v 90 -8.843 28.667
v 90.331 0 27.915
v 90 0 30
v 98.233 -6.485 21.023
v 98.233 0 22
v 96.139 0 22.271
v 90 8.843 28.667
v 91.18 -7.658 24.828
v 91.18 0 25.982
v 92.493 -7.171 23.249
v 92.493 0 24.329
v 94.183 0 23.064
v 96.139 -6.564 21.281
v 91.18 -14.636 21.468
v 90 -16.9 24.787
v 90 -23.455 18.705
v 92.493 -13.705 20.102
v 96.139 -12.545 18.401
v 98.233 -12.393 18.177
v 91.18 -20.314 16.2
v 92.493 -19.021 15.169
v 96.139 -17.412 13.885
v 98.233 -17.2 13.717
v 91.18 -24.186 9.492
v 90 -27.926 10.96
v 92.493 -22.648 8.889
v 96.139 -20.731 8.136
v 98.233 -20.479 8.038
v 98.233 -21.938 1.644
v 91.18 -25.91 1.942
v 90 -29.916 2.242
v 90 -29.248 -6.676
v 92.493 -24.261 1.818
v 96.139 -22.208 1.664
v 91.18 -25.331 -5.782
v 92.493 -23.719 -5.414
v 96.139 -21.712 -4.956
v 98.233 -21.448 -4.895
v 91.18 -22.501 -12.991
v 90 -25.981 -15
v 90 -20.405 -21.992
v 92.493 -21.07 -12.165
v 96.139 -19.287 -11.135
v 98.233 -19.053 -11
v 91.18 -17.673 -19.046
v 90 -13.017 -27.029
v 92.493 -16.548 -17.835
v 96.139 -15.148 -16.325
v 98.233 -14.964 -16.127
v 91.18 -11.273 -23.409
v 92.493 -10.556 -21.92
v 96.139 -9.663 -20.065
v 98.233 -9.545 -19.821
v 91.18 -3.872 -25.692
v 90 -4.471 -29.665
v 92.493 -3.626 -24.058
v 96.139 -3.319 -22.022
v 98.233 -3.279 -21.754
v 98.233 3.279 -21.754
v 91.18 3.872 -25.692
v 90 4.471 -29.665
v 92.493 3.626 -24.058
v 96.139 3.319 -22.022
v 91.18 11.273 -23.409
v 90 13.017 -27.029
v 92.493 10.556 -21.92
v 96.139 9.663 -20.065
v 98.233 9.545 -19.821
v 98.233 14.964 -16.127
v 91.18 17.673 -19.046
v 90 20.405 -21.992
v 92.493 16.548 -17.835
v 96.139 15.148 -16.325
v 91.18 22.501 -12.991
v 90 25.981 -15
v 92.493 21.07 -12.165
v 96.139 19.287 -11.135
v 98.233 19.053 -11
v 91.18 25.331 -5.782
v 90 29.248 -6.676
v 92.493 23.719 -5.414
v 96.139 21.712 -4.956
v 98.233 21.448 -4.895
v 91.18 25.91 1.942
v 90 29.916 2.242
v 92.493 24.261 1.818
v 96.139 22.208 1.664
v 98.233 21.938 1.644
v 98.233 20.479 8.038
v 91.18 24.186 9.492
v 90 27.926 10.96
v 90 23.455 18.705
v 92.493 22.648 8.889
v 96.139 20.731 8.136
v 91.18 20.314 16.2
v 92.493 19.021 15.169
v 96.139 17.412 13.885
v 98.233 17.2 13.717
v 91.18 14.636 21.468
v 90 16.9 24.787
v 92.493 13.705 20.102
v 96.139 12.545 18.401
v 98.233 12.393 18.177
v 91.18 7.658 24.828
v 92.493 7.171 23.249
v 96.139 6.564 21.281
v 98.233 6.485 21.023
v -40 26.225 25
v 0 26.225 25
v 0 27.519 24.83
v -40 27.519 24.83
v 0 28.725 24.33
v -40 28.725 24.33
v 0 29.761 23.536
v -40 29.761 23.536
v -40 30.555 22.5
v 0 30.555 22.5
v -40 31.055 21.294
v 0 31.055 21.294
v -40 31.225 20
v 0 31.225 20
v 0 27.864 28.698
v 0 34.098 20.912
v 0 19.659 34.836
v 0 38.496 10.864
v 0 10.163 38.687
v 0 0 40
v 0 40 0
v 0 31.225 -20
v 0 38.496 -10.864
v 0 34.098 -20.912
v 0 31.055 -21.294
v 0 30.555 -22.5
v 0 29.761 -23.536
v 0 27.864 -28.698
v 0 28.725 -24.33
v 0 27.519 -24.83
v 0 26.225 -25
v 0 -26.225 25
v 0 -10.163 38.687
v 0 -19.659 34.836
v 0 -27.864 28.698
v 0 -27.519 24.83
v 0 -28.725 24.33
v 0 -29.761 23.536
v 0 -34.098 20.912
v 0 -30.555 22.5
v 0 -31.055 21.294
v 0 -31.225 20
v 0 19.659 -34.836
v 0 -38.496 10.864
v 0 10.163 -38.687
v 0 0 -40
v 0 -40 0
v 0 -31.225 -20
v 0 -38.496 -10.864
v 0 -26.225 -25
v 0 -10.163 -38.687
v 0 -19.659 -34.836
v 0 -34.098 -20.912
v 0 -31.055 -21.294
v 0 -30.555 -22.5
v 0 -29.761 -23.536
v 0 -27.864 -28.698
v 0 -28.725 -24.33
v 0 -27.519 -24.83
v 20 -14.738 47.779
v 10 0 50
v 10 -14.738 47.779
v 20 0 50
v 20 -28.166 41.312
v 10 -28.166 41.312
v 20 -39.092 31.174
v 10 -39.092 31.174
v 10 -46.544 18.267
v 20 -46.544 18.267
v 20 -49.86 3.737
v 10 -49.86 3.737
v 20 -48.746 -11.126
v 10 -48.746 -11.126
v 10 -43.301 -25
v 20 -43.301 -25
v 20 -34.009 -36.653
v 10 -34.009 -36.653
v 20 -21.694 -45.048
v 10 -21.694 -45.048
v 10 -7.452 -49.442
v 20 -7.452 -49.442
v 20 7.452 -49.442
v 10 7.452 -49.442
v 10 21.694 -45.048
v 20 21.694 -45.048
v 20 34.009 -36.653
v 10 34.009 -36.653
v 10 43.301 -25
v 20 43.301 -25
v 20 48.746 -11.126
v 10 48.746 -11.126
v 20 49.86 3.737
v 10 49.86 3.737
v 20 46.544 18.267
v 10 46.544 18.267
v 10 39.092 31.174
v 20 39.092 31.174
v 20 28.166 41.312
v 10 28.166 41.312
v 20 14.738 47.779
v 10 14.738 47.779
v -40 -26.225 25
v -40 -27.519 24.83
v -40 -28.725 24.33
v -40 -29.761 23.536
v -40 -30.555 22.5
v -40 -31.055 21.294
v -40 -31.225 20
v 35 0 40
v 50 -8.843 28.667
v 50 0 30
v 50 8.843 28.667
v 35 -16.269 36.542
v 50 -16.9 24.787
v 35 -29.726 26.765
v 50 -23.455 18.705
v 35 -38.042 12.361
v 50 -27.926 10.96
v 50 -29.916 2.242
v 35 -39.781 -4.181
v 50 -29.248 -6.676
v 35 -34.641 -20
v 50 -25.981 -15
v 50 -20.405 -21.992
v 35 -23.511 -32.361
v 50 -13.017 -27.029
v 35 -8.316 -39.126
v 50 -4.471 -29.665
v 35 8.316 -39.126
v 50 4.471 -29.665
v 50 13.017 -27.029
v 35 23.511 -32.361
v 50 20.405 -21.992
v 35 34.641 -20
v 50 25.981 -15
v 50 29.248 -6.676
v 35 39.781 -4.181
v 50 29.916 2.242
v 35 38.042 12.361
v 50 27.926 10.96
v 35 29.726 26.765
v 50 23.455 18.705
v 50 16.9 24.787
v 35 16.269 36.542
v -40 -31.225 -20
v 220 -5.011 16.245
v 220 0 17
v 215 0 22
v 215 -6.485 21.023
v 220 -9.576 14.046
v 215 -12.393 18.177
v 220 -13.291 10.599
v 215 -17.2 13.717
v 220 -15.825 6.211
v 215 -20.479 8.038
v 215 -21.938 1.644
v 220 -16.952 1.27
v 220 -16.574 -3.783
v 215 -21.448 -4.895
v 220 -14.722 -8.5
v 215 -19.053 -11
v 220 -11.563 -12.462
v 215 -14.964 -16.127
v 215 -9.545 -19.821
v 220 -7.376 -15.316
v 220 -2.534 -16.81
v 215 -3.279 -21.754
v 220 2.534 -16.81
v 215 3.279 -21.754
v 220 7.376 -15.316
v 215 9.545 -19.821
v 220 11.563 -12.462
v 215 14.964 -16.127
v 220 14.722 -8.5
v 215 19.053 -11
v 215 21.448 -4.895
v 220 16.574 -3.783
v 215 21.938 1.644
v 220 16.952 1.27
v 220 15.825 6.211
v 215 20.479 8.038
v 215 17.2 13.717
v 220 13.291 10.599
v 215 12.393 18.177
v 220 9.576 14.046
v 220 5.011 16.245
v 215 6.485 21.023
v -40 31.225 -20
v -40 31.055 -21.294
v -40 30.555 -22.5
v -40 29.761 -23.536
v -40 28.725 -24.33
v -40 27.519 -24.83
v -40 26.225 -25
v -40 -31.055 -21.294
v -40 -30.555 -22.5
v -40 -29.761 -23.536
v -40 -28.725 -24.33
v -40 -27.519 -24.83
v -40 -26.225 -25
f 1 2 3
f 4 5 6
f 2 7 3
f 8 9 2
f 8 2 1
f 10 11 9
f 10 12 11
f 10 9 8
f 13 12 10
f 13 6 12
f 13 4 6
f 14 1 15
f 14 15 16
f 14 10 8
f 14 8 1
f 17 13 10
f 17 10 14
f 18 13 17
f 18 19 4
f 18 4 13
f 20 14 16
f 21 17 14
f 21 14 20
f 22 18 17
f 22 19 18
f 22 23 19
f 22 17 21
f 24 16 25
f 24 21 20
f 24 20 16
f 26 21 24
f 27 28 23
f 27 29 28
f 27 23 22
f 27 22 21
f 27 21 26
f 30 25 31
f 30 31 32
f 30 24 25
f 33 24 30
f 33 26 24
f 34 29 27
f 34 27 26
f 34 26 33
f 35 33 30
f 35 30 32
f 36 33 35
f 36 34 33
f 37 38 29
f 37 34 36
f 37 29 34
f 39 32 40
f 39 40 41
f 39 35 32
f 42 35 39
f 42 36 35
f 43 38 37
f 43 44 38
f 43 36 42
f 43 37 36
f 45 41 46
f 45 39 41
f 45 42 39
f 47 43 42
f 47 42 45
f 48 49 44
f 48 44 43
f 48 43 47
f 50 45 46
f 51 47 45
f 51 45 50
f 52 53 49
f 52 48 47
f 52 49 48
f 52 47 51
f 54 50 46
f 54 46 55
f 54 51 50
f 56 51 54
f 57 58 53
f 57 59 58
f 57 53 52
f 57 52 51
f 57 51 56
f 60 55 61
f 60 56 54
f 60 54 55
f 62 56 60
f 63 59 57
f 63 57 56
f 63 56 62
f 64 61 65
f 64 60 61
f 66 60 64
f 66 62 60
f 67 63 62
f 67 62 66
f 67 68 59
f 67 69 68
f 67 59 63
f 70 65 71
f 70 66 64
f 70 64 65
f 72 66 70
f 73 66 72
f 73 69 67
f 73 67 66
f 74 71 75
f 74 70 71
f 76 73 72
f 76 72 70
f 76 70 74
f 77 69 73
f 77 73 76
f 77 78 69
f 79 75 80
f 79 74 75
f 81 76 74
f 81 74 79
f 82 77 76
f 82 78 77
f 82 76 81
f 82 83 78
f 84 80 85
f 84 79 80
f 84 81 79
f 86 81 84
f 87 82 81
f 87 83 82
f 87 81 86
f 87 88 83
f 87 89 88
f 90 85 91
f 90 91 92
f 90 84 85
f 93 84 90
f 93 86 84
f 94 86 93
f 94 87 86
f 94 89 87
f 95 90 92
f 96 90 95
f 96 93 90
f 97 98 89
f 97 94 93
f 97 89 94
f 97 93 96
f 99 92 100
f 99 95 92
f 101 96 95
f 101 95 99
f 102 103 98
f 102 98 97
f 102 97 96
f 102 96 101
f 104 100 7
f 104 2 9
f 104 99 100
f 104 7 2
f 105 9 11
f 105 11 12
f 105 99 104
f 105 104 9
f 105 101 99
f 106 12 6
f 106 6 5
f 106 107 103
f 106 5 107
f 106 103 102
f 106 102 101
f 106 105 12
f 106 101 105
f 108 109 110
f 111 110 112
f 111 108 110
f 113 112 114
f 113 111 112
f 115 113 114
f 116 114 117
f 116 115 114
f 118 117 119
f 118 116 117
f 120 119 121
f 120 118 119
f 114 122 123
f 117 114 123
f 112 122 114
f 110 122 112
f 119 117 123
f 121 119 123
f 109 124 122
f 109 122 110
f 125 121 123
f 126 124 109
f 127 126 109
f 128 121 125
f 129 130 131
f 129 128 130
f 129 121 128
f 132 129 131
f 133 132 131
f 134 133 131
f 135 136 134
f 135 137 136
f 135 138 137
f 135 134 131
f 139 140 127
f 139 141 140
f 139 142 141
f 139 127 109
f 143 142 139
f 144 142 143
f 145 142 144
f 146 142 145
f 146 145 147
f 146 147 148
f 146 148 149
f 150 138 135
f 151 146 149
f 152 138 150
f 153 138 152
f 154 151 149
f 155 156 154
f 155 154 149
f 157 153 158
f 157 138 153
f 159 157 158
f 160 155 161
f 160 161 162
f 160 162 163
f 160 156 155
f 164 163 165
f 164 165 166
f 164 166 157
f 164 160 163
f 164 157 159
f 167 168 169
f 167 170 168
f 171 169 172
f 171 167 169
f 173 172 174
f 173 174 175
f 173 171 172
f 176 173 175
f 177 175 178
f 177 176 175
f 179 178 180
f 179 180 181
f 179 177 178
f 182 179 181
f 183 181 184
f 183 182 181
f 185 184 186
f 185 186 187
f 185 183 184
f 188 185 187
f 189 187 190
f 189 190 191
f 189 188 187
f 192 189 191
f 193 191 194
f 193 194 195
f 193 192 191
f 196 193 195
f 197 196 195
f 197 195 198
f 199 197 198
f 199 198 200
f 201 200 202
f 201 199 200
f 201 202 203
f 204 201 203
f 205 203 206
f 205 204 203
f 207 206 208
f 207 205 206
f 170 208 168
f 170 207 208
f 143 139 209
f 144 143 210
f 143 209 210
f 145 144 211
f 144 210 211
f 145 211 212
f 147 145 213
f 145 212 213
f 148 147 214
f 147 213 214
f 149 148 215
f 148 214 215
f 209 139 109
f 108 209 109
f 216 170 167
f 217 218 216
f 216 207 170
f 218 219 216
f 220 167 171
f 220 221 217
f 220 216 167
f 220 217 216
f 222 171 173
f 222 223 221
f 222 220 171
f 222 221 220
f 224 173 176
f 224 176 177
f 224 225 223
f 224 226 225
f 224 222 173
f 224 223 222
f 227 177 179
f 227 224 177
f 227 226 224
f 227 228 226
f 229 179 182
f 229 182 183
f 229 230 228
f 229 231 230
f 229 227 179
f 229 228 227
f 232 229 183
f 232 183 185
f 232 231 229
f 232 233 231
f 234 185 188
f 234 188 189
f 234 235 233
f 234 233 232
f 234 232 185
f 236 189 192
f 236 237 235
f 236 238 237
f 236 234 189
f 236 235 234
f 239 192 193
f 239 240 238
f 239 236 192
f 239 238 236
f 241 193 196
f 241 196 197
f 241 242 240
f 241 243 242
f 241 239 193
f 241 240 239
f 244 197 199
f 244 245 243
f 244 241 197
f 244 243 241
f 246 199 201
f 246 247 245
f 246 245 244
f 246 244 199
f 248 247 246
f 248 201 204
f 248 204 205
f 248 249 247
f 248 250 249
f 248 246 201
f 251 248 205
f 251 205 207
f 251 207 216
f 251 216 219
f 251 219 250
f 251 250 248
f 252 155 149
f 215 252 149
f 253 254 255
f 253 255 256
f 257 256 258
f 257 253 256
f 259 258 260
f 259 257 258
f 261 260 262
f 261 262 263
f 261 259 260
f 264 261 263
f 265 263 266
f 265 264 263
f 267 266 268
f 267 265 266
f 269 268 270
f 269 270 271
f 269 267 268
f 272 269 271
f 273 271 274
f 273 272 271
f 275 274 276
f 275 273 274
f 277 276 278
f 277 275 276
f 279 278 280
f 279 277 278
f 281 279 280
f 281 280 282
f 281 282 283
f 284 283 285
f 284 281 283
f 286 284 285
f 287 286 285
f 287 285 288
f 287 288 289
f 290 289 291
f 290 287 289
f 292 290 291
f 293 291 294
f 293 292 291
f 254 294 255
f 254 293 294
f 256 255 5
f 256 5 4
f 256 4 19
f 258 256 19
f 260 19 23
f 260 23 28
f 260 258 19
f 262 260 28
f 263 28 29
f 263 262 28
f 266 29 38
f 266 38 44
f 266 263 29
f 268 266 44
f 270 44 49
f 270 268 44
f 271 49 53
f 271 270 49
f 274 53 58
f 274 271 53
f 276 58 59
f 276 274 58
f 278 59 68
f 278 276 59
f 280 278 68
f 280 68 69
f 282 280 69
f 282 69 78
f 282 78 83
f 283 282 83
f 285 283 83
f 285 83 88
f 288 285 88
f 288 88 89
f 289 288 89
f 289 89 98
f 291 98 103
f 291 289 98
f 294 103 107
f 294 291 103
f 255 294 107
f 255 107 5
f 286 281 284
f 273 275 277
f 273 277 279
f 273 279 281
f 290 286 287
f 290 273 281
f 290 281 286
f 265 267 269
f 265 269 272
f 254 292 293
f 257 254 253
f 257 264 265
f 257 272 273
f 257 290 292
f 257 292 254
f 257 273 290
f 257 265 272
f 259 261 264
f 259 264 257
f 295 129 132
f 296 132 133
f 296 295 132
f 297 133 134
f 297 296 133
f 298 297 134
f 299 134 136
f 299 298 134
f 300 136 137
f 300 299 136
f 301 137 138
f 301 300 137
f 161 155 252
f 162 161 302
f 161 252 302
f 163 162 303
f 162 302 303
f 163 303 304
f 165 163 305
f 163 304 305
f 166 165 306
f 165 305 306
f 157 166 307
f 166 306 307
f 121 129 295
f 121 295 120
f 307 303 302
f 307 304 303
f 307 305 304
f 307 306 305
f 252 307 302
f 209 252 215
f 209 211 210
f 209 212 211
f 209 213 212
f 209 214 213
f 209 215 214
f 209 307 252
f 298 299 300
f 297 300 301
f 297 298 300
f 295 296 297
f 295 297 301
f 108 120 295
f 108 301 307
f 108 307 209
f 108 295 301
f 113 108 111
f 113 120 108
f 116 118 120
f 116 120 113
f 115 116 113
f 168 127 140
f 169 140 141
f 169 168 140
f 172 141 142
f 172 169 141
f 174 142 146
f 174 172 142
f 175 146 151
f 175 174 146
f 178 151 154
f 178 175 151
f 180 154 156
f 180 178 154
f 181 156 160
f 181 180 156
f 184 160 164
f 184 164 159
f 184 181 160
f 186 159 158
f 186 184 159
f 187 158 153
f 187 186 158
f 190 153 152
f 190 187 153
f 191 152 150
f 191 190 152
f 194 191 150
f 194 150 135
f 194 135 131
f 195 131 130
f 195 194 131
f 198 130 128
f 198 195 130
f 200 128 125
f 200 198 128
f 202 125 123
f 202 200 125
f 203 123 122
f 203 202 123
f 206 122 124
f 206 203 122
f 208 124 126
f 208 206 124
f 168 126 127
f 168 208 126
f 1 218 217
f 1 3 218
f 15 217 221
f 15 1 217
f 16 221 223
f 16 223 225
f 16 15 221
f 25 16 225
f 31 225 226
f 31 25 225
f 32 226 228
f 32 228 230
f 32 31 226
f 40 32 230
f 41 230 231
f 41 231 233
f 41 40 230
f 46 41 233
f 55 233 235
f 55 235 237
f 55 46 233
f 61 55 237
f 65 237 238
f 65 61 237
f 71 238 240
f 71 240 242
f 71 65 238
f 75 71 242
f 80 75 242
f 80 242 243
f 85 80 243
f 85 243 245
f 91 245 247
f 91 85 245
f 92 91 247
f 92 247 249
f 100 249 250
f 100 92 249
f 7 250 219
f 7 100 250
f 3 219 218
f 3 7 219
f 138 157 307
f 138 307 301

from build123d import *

# Parameters (mm, degrees)
SKETCH1_W           = 10
SKETCH1_H           = 50
SKETCH1_W_2         = 40
SKETCH1_H_2         = 30
SKETCH1_W_3         = 121.767034814
SKETCH1_H_3         = 22
SKETCH2_W           = 50
SKETCH2_H           = 62.449979984
BOSS_EXTRUDE1_DEPTH = 40
FILLET2_R           = 5
FILLET3_R           = 5
CHAMFER1_SIZE       = 5


with BuildPart() as part:
    # Sketch1 → Revolve1 (revolve)
    with BuildSketch(Plane.XY, mode=Mode.PRIVATE) as revolve1_sk:
        Polygon((10, 0), (0, 0), (0, -40), (10, -50), align=None)
        with Locations((15, -25)):
            Rectangle(SKETCH1_W, SKETCH1_H)
        Polygon((50, 0), (20, 0), (20, -50), (50, -30), align=None)
        with Locations((70, -15)):
            Rectangle(SKETCH1_W_2, SKETCH1_H_2)
        with BuildLine():
            Line((98.232965186, 0), (90, 0))
            Line((90, 0), (90, -30))
            ThreePointArc((90, -30), (92.493154306, -24.329399341), (98.232965186, -22))
            Line((98.232965186, -22), (98.232965186, 0))
        make_face()
        with Locations((159.116482593, -11)):
            Rectangle(SKETCH1_W_3, SKETCH1_H_3)
    revolve(revolve1_sk.sketch.rotate(Axis((0, 0, 0), (1, 0, 0)), 270), axis=Axis((0, 0, 0), (1, 0, 0)))

    # Sketch2 → Boss-Extrude1 (add)
    with BuildSketch(Plane.ZY):
        Rectangle(SKETCH2_W, SKETCH2_H)
    extrude(amount=BOSS_EXTRUDE1_DEPTH)

    # Fillet2
    fillet2_edges = [part.edges().sort_by_distance(p)[0] for p in [
        (-20, 31.224989992, 25),
    ]]
    fillet(fillet2_edges, radius=FILLET2_R)

    # Fillet3
    fillet3_edges = [part.edges().sort_by_distance(p)[0] for p in [
        (-20, -31.224989992, 25),
        (-20, 31.224989992, -25),
        (-20, -31.224989992, -25),
    ]]
    fillet(fillet3_edges, radius=FILLET3_R)

    # Chamfer1
    chamfer1_edges = [part.edges().sort_by_distance(p)[0] for p in [
        (220, 0, -22),
    ]]
    chamfer(chamfer1_edges, length=CHAMFER1_SIZE)


solid = part.part
